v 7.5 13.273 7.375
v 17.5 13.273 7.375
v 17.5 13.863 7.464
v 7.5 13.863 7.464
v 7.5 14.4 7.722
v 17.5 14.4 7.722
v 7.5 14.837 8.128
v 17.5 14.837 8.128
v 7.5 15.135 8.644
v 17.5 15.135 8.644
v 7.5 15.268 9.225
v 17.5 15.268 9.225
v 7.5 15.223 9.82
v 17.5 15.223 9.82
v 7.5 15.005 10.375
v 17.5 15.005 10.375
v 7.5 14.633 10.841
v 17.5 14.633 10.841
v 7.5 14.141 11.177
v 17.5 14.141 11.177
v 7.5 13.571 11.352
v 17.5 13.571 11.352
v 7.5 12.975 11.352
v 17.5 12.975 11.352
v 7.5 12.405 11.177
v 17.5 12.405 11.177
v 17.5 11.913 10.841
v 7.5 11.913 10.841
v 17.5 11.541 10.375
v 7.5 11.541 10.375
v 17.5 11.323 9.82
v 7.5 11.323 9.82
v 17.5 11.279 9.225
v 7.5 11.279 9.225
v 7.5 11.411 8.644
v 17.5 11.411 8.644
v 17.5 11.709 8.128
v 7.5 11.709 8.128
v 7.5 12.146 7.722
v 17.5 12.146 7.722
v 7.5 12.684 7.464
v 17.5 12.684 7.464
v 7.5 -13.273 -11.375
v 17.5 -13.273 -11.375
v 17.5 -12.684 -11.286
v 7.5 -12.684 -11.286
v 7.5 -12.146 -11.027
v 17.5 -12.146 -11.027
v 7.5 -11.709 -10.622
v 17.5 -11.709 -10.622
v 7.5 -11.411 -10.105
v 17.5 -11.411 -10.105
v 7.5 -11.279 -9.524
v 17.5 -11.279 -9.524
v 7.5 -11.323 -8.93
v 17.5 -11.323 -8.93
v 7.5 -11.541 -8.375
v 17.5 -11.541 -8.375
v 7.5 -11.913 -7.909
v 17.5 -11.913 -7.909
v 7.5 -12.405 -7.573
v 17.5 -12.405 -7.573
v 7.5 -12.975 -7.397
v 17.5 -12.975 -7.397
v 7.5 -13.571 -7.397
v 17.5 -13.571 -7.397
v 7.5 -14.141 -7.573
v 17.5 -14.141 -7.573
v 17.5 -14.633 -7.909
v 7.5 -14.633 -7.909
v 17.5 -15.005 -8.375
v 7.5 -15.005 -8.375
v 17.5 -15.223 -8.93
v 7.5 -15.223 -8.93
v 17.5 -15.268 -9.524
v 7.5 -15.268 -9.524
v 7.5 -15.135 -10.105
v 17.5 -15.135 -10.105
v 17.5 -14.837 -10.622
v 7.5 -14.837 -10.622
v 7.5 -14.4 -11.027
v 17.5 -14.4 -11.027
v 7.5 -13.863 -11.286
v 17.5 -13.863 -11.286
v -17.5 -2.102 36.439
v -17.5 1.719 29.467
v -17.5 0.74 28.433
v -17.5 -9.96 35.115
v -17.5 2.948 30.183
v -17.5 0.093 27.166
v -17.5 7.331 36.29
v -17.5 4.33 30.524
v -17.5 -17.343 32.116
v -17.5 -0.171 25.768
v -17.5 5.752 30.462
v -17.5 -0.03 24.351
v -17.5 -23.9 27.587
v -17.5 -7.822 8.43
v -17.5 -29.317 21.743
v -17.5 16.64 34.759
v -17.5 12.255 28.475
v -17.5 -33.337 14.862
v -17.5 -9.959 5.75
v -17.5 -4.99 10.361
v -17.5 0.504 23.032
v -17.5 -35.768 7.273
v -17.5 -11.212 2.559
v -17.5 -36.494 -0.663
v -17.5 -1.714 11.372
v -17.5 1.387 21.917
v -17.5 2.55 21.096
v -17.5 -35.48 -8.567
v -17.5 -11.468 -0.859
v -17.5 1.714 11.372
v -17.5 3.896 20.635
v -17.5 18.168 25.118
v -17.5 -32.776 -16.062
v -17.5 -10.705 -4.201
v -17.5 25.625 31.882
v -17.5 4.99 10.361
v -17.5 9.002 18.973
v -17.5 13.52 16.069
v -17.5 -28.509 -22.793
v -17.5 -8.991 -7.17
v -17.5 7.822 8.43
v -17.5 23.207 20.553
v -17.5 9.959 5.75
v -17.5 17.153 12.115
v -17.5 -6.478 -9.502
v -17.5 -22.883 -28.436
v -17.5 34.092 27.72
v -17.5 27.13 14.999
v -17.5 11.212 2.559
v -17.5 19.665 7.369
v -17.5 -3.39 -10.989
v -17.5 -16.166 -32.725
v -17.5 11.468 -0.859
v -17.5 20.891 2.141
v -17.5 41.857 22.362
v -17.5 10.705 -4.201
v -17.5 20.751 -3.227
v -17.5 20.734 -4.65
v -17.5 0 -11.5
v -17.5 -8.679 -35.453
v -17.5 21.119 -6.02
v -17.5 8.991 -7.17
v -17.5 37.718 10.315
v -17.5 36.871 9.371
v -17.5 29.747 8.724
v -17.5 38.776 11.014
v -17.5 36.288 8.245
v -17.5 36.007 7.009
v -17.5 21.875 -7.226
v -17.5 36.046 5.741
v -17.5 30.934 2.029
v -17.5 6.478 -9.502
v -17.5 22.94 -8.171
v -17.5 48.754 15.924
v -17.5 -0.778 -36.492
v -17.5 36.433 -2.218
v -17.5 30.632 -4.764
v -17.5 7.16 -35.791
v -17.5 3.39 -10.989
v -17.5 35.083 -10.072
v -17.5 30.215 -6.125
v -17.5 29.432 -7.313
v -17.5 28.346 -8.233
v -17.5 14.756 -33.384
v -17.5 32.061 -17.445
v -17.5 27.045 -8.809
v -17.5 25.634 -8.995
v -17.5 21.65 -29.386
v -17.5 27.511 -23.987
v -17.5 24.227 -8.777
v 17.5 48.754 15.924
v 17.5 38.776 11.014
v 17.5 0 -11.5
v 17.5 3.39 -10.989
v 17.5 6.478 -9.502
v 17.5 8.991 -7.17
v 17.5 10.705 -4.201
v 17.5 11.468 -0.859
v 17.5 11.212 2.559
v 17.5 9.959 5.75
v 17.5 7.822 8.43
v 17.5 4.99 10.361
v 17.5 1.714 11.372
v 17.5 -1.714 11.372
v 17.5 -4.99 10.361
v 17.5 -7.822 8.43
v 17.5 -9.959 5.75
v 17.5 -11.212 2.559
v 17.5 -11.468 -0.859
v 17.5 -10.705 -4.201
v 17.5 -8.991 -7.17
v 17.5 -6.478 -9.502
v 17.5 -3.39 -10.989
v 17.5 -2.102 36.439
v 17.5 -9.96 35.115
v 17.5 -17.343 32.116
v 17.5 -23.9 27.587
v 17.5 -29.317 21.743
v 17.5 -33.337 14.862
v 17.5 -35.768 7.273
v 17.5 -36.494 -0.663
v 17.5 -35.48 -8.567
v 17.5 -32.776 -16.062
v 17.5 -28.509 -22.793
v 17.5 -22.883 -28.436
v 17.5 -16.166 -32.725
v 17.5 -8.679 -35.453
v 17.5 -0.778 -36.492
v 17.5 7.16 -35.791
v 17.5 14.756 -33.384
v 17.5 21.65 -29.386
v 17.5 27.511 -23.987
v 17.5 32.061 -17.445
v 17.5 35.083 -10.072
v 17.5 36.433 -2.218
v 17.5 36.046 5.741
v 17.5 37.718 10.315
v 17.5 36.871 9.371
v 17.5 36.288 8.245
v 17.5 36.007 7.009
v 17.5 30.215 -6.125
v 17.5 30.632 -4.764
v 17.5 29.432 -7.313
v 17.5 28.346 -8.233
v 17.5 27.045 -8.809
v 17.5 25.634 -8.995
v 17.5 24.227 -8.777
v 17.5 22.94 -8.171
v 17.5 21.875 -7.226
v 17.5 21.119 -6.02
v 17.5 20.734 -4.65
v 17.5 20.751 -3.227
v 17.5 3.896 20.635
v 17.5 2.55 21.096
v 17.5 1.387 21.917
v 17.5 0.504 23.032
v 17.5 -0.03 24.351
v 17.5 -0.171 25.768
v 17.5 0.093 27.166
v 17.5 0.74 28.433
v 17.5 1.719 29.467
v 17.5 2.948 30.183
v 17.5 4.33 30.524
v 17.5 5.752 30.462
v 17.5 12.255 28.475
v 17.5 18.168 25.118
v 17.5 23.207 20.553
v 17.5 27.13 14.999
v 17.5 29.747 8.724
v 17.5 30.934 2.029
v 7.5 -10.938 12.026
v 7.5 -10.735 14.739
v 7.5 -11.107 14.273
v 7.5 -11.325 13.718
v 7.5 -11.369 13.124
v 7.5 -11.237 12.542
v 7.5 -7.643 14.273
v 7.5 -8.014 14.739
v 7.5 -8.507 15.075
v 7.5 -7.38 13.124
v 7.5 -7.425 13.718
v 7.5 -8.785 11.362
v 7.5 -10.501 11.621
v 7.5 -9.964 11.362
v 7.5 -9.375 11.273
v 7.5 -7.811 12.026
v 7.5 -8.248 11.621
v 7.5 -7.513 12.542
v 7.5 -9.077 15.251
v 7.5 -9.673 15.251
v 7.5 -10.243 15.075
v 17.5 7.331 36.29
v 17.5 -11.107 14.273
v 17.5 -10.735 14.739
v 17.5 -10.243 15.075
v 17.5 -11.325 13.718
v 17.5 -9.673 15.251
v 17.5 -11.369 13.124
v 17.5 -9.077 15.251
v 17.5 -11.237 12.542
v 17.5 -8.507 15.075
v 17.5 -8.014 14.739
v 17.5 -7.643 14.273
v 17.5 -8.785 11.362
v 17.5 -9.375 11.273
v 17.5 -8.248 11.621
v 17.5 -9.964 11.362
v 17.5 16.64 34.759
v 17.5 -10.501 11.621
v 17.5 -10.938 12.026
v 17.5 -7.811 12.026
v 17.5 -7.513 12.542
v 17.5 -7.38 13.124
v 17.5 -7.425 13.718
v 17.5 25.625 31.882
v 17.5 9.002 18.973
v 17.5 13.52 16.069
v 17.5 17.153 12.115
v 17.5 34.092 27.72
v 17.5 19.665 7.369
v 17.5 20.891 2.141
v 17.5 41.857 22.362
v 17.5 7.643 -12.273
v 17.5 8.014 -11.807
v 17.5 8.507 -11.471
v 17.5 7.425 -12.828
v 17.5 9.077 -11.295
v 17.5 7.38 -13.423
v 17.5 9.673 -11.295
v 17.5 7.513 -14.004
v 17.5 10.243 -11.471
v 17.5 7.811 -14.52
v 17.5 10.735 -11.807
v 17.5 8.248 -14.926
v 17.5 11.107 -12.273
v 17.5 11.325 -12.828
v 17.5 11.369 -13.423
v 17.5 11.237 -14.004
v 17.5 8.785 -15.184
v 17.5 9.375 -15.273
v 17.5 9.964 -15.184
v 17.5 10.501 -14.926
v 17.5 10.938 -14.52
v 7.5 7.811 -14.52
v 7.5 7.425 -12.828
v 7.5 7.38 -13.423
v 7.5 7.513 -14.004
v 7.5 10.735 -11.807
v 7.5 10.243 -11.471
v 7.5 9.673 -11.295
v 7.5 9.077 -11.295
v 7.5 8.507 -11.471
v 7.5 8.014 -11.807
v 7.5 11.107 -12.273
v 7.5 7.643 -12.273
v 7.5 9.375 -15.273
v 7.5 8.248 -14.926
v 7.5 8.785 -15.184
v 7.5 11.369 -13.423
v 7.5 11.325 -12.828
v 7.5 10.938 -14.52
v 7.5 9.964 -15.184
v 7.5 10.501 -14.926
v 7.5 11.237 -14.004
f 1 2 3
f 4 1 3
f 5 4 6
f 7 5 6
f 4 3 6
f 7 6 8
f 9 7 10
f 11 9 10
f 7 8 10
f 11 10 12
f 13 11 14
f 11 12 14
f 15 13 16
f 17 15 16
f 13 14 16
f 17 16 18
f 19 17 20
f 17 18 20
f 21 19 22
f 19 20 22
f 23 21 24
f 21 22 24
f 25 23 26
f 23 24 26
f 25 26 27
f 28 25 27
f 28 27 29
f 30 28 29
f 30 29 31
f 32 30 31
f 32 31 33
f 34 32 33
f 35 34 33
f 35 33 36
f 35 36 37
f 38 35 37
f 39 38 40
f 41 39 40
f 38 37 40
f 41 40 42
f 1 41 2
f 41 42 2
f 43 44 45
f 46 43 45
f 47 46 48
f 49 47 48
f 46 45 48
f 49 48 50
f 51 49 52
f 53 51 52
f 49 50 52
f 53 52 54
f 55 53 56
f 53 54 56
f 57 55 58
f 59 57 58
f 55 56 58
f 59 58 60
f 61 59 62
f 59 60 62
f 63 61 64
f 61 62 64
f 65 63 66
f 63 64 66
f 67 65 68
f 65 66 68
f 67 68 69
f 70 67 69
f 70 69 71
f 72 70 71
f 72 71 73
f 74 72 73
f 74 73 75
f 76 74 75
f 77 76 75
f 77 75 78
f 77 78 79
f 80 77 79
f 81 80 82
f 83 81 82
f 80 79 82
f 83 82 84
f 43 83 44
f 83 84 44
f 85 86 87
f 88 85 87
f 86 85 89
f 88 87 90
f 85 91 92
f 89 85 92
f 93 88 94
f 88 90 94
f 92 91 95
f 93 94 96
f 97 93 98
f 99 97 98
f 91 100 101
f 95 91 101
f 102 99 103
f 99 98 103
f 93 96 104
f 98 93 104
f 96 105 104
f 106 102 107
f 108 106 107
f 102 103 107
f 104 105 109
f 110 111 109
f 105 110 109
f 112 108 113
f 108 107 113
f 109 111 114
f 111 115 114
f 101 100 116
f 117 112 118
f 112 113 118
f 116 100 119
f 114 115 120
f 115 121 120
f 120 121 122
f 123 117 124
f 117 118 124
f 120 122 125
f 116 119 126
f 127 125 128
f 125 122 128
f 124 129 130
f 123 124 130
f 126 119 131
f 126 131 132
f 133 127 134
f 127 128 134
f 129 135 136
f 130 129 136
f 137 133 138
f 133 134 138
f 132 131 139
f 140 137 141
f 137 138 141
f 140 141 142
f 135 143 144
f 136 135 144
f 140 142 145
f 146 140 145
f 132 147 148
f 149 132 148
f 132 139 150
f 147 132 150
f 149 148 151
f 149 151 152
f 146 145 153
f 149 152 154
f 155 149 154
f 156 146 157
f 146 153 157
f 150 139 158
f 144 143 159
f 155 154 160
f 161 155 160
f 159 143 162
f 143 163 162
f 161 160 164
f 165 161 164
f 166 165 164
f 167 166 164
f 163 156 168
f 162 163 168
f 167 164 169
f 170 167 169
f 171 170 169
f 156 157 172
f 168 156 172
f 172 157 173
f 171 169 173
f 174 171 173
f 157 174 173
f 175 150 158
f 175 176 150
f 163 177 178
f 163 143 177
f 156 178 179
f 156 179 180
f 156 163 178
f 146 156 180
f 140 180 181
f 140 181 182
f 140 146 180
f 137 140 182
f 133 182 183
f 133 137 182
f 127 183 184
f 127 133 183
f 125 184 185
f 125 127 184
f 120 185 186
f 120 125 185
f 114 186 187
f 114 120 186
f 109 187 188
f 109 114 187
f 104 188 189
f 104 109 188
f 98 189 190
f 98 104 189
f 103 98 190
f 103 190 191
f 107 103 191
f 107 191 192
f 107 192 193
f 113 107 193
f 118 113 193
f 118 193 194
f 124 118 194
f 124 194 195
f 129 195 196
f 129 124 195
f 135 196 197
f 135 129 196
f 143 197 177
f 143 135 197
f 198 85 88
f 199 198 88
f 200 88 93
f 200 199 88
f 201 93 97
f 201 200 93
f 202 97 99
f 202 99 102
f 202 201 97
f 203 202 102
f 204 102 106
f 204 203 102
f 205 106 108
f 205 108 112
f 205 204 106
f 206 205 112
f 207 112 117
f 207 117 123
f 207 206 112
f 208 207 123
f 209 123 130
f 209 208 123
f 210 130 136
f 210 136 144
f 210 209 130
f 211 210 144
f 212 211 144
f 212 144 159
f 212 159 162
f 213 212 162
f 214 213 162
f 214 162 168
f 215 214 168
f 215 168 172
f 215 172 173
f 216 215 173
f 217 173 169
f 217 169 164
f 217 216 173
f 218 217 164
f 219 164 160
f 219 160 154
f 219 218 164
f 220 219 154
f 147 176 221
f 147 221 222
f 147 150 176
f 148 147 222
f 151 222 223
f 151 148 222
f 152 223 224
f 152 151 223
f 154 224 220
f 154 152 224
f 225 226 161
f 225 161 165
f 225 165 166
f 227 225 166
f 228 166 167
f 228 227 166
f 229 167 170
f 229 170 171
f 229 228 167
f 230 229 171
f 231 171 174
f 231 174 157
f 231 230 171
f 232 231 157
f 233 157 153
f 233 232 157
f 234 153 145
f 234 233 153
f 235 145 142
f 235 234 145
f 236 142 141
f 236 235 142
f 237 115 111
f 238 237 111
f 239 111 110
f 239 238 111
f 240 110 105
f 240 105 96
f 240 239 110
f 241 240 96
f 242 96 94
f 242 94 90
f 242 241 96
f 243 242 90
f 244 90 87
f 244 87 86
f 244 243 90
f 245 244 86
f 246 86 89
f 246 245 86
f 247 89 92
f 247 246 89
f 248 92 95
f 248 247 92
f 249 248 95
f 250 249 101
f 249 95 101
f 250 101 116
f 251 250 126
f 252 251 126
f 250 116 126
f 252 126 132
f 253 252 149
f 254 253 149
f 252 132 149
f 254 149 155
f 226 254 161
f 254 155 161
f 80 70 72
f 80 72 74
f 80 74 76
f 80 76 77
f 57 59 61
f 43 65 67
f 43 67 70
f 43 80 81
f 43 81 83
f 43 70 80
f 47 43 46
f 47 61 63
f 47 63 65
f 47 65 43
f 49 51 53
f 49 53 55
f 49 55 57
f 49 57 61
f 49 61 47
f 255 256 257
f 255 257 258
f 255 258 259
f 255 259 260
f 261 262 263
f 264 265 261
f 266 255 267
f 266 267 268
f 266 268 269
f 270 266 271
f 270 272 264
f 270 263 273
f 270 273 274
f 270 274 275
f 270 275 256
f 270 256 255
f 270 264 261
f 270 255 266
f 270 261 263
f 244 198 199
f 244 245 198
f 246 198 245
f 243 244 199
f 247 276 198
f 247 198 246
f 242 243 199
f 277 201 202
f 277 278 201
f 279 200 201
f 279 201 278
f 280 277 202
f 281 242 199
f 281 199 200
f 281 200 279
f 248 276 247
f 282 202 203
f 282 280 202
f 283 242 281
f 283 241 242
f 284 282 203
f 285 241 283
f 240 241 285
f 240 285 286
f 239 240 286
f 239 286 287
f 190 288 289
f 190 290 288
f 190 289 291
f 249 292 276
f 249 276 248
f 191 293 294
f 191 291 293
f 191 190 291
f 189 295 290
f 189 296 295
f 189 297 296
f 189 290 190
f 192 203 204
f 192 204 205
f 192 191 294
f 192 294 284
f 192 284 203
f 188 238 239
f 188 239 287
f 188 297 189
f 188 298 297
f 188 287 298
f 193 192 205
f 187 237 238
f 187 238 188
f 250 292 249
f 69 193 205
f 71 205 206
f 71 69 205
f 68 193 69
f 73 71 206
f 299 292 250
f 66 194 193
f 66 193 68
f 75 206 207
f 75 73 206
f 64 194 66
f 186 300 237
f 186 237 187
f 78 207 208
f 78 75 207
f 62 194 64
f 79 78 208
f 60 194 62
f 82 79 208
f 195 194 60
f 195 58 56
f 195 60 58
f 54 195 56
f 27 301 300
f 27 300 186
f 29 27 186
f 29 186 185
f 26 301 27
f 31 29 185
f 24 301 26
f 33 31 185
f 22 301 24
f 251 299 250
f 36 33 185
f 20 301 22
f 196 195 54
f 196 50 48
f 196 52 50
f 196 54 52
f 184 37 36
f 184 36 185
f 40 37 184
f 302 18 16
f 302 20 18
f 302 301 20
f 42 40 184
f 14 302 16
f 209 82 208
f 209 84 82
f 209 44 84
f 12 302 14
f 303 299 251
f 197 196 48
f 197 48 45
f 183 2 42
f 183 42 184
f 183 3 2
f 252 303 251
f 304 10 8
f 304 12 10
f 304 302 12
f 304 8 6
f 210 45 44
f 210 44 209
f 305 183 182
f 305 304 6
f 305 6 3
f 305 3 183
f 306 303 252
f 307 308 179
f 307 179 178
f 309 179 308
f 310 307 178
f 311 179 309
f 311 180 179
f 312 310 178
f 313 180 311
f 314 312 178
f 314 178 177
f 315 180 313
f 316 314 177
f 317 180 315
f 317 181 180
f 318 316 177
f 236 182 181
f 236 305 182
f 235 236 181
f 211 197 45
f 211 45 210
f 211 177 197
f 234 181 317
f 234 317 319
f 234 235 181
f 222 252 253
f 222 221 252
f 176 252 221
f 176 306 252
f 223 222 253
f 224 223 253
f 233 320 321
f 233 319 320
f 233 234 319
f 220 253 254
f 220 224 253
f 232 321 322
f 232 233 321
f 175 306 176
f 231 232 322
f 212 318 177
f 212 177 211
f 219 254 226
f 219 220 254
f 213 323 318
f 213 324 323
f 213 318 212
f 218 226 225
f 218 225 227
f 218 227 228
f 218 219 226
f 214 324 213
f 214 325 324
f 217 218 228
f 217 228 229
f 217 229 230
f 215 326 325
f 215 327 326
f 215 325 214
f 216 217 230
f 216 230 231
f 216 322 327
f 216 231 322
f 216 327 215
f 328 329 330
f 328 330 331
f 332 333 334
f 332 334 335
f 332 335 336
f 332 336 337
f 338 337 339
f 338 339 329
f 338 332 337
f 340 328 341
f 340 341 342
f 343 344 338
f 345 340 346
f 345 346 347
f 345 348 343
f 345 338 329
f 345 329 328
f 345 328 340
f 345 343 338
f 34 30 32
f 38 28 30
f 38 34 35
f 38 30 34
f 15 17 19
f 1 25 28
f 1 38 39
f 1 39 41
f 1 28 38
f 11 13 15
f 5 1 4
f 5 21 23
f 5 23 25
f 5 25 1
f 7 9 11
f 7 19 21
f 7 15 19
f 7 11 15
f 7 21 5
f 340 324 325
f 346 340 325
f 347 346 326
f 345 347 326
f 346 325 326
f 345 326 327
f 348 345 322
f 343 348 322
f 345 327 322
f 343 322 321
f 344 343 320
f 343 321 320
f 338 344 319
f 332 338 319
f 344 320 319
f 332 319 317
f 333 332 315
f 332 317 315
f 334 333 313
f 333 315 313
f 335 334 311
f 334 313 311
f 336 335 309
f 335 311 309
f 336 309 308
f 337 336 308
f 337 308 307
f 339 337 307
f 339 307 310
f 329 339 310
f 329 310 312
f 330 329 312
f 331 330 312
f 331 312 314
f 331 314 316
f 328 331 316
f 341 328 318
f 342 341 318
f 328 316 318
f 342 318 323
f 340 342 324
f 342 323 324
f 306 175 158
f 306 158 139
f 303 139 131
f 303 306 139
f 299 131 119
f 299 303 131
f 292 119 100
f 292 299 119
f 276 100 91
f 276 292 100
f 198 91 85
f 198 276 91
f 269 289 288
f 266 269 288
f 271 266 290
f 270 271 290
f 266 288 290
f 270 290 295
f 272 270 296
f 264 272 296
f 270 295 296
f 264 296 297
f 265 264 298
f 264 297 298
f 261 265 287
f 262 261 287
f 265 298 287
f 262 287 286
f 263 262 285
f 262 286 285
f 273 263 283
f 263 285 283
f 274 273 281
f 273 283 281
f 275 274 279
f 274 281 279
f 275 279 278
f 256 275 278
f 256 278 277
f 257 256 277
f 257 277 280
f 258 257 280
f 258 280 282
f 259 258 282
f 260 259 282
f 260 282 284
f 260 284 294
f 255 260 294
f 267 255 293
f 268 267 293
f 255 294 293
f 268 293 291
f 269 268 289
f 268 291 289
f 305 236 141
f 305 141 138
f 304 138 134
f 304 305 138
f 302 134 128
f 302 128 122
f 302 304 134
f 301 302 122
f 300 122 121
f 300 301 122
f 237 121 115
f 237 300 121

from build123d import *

# Parameters (mm, degrees)
ESBO_O1_R                = 11.5
RESSALTO_EXTRUS_O1_DEPTH = 17.5
FILLET1_R                = 5
ESBO_O2_R                = 2
CORTE_EXTRUS_O1_DEPTH    = 10


with BuildPart() as part:
    # Esboço1 → Ressalto-extrusão1 (new, symmetric)
    with BuildSketch(Plane(origin=(0, 0, 0), x_dir=(0, 0, -1), z_dir=(1, 0, 0))):
        with BuildLine():
            Line((-9.301463672, 35.294939773), (-15.923932545, 48.753873832))
            ThreePointArc((-15.923932545, 48.753873832), (-31.882117783, 25.625328571), (-36.439403175, -2.102354921))
            ThreePointArc((-36.439403175, -2.102354921), (29.541430866, -21.43720743), (-9.301463672, 35.294939773))
        make_face()
        Circle(ESBO_O1_R, mode=Mode.SUBTRACT)
        with BuildLine():
            ThreePointArc((-30.461709826, 5.751889646), (-17.884176458, 25.321063019), (4.764081686, 30.631740494))
            ThreePointArc((4.764081686, 30.631740494), (8.936284719, 24.922736917), (3.227281142, 20.750533883))
            ThreePointArc((3.227281142, 20.750533883), (-12.115087278, 17.152978174), (-20.635351817, 3.896441373))
            ThreePointArc((-20.635351817, 3.896441373), (-26.476254958, -0.089013495), (-30.461709826, 5.751889646))
        make_face(mode=Mode.SUBTRACT)
    extrude(amount=RESSALTO_EXTRUS_O1_DEPTH, both=True)

    # Fillet1
    fillet1_edges = [part.edges().sort_by_distance(p)[0] for p in [
        (0, 35.294939773, 9.301463672),
    ]]
    fillet(fillet1_edges, radius=FILLET1_R)

    # Esboço2 → Corte-extrusão1 (cut)
    with BuildSketch(Plane(origin=(17.5, 0, 0), x_dir=(0, 0, -1), z_dir=(1, 0, 0))):
        with Locations((-9.374769917, 13.273137873)):
            Circle(ESBO_O2_R)
        with Locations((13.273137873, 9.374769917)):
            Circle(ESBO_O2_R)
        with Locations((9.374769917, -13.273137873)):
            Circle(ESBO_O2_R)
        with Locations((-13.273137873, -9.374769917)):
            Circle(ESBO_O2_R)
    extrude(amount=-CORTE_EXTRUS_O1_DEPTH, mode=Mode.SUBTRACT)


solid = part.part
